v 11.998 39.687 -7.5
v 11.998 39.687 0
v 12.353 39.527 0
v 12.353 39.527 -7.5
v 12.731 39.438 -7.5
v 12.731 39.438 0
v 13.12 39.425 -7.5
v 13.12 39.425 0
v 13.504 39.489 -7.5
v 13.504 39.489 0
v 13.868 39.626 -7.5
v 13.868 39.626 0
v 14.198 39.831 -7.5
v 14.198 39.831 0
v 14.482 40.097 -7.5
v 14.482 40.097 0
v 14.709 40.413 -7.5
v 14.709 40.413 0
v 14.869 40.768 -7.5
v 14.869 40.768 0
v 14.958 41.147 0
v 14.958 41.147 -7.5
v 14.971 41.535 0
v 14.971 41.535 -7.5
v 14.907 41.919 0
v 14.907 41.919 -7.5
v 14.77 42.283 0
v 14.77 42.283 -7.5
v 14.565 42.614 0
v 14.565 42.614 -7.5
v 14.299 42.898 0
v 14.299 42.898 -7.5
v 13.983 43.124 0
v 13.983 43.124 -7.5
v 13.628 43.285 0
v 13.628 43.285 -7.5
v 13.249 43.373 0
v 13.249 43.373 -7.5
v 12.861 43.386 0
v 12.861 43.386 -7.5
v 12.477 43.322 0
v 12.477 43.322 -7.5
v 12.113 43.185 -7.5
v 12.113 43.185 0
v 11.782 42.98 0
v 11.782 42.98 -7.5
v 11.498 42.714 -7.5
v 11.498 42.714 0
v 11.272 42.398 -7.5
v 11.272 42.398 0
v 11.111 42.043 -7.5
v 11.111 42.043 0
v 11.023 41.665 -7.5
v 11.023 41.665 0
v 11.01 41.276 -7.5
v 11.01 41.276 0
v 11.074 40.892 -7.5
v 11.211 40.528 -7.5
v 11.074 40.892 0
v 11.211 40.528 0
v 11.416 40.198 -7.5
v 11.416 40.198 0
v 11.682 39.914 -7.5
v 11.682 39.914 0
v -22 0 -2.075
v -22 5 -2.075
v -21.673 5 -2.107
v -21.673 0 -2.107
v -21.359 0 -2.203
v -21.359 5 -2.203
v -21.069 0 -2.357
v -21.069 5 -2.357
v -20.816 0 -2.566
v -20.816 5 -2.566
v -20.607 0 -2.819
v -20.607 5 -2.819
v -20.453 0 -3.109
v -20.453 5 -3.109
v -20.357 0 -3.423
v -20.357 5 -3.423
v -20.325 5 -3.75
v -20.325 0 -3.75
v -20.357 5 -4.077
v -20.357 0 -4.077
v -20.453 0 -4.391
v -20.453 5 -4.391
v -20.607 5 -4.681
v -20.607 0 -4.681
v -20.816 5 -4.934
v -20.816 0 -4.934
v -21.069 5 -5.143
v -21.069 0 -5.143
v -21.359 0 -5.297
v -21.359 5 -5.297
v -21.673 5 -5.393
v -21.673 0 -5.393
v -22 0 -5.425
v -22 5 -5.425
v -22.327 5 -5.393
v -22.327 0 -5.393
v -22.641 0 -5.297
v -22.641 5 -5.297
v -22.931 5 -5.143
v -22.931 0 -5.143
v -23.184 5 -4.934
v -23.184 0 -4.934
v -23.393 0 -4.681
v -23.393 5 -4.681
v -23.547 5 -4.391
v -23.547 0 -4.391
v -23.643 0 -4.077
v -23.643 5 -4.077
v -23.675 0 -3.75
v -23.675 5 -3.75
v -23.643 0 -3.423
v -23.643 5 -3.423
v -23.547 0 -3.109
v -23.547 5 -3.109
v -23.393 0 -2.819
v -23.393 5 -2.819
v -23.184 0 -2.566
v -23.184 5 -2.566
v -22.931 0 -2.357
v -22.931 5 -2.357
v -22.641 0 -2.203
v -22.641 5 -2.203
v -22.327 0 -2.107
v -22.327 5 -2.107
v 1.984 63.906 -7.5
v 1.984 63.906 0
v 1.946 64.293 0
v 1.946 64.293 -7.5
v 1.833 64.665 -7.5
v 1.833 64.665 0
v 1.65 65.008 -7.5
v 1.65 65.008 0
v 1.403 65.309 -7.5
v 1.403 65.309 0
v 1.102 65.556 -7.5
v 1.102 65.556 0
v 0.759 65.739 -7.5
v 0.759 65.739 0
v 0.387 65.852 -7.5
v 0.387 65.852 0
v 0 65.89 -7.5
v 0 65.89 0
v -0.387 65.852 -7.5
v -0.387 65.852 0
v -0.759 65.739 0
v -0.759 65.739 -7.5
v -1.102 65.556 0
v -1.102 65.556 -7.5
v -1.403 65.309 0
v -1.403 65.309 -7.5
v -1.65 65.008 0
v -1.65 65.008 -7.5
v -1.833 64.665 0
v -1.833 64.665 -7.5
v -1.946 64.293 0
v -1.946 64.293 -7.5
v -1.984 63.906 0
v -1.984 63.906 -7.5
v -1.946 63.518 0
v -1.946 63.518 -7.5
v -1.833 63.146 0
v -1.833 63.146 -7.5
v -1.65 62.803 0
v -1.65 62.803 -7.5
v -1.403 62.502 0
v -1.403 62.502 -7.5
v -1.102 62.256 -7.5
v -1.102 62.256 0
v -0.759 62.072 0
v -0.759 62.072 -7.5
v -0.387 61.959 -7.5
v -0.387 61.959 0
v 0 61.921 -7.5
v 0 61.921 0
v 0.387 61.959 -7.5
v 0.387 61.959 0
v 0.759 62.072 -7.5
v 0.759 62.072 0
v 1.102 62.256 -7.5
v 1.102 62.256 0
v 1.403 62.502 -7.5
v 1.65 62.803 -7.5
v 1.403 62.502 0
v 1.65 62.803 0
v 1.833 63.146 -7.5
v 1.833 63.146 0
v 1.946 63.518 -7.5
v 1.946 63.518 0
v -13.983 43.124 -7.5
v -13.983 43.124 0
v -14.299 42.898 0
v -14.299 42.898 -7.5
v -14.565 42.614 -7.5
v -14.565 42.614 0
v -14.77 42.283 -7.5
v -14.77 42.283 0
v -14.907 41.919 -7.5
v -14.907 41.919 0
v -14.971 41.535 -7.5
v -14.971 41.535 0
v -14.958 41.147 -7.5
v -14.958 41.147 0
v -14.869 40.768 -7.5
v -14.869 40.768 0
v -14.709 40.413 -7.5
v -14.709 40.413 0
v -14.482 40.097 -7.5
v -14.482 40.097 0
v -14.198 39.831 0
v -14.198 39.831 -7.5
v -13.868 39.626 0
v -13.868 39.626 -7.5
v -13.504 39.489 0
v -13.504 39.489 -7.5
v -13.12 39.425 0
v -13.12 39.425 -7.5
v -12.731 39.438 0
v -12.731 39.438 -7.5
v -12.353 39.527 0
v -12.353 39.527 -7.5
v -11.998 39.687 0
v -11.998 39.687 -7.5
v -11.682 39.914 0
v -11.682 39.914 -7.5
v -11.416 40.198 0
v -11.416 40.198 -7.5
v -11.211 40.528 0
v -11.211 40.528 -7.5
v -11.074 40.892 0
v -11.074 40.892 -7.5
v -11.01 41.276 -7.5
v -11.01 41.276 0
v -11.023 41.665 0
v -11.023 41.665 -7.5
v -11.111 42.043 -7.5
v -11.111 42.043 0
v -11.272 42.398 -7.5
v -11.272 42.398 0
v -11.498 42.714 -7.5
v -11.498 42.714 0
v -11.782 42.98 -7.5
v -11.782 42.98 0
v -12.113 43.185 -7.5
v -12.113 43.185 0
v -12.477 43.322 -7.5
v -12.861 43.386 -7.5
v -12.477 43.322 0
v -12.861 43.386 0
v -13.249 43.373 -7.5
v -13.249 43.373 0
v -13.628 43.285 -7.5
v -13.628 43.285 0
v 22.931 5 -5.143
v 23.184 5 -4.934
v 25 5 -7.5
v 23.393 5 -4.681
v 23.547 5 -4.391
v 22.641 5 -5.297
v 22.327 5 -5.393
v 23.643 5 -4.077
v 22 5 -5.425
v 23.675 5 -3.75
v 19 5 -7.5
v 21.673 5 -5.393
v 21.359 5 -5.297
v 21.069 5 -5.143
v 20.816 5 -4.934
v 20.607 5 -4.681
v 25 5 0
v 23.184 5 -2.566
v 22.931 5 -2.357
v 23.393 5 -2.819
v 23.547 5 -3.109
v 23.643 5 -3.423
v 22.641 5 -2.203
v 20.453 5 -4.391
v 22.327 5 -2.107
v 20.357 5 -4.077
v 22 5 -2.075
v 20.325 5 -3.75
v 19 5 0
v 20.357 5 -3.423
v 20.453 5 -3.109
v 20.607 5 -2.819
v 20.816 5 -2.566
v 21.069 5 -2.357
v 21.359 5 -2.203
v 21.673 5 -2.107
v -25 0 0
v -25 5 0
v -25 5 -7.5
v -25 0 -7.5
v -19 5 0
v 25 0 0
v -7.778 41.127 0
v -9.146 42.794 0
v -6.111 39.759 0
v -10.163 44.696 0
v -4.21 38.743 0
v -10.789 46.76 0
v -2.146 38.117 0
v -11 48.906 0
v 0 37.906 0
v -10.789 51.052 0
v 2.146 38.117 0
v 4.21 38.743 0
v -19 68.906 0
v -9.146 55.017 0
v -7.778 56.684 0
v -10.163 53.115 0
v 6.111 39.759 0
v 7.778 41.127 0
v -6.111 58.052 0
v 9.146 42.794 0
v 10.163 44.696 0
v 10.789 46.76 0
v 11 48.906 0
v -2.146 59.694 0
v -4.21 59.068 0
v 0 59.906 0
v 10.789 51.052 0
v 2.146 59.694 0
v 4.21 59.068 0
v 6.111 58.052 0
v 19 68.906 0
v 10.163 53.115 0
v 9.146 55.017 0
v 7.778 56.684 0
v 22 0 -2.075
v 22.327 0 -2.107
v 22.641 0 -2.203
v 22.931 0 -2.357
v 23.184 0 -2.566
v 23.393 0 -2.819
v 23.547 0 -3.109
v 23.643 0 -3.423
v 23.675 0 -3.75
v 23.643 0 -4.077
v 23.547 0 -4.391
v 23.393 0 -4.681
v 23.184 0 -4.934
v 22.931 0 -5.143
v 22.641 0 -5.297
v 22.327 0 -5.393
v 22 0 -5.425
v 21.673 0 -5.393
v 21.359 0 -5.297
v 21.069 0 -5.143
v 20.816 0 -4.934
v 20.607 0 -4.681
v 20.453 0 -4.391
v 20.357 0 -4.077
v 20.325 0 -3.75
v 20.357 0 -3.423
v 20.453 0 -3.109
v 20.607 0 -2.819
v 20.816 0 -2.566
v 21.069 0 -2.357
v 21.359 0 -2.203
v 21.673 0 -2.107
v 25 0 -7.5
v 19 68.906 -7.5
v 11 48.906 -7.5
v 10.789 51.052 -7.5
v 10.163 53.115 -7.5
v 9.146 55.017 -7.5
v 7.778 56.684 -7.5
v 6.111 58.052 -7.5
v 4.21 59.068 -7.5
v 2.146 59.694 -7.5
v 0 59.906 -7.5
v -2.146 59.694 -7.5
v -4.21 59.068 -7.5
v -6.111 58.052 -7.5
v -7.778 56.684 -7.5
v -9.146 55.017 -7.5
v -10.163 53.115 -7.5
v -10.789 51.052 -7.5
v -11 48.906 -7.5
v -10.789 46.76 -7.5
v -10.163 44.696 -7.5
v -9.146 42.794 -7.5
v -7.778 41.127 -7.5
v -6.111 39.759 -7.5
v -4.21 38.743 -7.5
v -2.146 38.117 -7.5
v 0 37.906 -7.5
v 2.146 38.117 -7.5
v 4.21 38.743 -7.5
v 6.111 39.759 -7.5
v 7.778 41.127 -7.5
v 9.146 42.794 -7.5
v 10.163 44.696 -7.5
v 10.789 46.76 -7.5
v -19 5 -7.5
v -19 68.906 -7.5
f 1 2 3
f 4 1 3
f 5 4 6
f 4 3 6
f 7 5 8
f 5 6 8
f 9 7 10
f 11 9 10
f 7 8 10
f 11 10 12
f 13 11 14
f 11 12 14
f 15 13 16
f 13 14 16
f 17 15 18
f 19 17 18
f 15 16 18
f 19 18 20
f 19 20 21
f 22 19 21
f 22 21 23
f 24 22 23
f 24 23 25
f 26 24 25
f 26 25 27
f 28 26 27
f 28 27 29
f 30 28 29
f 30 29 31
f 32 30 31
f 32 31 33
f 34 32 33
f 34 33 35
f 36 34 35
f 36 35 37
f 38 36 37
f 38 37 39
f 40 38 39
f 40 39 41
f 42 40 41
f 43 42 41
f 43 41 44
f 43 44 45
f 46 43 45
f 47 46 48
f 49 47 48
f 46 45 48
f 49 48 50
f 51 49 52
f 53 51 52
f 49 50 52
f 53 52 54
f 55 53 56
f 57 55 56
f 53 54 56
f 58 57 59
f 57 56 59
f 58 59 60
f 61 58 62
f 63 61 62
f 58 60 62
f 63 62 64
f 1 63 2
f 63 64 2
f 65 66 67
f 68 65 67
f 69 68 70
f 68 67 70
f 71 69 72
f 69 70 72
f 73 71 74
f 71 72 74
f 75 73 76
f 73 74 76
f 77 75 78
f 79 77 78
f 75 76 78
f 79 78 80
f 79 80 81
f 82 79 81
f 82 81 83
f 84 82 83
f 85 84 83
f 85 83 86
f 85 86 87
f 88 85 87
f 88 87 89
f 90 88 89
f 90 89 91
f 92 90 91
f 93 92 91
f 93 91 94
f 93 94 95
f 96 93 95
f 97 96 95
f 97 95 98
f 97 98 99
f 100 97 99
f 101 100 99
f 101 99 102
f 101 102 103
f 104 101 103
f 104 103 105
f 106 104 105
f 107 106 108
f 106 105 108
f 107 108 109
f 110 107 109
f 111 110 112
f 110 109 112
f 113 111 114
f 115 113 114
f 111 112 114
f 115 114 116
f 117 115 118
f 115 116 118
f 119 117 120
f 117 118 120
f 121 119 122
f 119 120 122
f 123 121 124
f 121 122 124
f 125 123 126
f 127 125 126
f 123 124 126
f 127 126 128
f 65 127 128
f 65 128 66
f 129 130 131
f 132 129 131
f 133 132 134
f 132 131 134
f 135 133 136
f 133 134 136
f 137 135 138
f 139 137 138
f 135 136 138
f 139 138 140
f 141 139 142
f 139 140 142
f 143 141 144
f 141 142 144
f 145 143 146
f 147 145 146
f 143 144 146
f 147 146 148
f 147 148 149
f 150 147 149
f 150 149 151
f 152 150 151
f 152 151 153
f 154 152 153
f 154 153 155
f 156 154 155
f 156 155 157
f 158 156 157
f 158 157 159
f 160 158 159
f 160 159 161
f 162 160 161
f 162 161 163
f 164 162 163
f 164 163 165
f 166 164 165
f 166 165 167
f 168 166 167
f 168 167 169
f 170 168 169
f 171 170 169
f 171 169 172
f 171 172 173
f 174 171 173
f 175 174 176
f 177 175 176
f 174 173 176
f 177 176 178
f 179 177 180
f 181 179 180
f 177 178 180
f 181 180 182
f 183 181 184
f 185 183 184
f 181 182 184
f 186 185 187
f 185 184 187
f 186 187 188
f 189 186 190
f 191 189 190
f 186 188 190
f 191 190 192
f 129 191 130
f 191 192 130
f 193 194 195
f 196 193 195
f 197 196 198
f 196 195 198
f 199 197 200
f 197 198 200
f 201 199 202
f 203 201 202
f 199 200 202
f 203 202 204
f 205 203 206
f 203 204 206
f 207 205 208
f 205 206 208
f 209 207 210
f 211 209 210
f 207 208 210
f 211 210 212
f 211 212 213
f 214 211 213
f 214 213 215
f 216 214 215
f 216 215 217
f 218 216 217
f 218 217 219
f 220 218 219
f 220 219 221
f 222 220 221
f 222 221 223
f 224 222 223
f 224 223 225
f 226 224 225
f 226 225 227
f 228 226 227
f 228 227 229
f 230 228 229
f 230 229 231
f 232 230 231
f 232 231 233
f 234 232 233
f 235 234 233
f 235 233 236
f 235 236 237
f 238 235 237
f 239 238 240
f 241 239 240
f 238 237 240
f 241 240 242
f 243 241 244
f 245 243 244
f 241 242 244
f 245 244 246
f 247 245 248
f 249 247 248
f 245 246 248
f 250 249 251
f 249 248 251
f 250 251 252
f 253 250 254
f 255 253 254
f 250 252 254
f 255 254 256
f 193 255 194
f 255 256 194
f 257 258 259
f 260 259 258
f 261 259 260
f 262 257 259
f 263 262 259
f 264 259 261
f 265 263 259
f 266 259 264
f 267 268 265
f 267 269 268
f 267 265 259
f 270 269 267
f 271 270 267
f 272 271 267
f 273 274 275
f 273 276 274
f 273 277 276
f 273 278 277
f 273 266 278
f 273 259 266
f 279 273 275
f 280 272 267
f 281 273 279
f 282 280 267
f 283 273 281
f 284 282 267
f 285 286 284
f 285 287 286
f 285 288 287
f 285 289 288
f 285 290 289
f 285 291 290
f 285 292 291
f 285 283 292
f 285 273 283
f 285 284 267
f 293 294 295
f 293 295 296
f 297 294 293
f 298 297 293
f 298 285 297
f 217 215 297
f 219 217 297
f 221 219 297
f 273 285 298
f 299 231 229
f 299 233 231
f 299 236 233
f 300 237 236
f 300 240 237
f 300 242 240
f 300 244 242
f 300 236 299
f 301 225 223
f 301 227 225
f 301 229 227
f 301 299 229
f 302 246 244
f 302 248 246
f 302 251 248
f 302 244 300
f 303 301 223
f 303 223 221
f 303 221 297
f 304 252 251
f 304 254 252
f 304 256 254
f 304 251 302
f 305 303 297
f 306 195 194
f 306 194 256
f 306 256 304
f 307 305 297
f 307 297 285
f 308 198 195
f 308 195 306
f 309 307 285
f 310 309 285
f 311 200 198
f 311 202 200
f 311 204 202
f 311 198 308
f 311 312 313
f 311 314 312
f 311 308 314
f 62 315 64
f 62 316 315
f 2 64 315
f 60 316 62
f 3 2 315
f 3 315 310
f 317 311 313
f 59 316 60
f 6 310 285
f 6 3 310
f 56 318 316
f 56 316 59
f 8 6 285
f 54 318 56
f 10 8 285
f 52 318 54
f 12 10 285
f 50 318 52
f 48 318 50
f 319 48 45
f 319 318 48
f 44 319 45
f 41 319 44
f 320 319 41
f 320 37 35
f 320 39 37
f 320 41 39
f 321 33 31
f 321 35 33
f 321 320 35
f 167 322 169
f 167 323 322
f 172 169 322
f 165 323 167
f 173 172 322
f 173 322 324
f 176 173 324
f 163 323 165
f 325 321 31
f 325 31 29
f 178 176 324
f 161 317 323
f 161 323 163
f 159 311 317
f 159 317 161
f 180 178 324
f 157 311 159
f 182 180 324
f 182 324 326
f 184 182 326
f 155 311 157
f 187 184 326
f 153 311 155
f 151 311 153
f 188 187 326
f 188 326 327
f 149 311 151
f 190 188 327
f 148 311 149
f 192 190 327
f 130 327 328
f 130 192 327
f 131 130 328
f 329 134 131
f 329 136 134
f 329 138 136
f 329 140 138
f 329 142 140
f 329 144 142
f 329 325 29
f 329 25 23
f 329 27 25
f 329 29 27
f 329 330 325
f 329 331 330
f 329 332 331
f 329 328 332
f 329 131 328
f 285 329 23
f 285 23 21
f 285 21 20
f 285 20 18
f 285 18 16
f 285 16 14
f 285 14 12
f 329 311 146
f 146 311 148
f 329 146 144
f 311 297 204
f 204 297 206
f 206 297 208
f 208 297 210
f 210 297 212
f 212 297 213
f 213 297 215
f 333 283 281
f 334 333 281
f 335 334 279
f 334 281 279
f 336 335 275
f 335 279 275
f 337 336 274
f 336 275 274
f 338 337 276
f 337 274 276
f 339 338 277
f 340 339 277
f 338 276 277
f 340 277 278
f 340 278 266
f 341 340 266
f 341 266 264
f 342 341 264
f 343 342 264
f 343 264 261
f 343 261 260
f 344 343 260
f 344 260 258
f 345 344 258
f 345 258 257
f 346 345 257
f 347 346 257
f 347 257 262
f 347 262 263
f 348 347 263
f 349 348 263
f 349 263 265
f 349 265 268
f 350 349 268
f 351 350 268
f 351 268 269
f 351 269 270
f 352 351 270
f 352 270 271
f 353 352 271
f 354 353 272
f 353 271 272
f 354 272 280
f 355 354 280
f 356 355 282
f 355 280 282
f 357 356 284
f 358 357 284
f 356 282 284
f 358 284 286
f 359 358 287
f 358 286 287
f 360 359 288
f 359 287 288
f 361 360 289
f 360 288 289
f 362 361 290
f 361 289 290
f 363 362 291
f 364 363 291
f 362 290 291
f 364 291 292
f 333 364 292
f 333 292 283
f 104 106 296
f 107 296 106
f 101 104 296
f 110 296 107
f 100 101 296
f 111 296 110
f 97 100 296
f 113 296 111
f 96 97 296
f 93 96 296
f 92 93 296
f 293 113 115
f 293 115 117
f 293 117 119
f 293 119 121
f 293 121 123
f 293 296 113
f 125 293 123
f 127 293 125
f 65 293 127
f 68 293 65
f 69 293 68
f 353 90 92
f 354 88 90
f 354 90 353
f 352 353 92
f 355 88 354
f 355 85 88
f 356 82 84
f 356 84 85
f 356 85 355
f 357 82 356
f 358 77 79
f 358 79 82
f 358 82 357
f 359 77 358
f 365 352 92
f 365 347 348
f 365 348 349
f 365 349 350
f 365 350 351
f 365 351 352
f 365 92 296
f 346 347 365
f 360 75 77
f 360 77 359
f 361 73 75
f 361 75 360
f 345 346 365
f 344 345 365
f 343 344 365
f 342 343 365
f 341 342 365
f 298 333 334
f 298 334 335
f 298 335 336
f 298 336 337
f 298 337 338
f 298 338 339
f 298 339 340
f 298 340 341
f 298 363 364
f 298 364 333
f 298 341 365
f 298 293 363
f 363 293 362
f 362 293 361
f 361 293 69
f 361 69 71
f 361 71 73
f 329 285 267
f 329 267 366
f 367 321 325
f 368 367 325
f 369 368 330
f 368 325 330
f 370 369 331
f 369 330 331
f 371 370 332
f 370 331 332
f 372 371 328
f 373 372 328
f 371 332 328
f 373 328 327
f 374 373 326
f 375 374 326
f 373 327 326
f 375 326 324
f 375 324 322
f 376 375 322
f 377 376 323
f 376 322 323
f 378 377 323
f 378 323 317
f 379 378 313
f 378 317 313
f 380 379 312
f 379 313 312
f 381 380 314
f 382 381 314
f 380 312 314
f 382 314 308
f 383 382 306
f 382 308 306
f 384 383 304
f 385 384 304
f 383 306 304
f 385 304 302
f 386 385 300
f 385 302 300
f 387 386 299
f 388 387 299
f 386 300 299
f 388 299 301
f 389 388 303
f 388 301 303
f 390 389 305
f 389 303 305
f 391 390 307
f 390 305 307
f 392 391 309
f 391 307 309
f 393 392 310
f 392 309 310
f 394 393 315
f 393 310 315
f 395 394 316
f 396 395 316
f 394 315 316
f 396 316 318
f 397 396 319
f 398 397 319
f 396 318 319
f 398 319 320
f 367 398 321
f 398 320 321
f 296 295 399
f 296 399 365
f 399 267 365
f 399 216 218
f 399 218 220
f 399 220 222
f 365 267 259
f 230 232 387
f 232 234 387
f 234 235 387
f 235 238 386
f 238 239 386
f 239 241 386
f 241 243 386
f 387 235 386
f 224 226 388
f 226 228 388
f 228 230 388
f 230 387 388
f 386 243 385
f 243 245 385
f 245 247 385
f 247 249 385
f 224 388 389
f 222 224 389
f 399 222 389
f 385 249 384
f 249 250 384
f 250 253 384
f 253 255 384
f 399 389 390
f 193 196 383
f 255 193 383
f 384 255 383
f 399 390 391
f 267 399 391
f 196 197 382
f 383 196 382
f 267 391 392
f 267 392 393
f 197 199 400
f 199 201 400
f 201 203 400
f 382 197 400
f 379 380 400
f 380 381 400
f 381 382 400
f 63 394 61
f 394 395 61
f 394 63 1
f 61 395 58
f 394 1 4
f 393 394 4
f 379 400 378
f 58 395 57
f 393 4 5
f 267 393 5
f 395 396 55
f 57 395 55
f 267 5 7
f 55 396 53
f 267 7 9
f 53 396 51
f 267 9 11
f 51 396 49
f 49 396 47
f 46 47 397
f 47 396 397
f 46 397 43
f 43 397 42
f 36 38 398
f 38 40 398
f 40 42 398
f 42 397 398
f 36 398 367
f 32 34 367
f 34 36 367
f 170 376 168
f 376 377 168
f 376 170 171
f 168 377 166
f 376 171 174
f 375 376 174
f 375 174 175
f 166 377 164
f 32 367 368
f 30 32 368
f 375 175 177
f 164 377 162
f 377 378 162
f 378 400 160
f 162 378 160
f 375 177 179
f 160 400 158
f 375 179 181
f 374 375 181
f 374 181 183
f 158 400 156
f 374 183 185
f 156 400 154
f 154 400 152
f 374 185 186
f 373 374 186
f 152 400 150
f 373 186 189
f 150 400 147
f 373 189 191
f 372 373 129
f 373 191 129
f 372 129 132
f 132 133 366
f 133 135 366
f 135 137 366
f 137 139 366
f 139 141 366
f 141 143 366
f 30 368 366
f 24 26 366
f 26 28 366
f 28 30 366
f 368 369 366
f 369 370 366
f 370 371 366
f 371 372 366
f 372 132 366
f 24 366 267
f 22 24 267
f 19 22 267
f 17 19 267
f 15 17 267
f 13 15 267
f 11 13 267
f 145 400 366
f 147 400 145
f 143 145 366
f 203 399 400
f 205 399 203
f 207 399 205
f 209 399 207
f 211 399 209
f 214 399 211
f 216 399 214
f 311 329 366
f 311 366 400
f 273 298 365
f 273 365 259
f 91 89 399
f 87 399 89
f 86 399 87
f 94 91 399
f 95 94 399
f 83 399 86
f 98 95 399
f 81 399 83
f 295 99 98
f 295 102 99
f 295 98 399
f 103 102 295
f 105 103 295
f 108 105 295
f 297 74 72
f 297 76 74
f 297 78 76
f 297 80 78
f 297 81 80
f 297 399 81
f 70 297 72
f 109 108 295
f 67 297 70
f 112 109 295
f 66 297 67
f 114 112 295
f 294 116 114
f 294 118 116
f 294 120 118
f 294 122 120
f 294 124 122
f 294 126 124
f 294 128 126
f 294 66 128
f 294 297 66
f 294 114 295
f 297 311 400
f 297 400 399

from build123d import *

# Parameters (mm, degrees)
SKETCH2_R           = 11
BOSS_EXTRUDE1_DEPTH = 7.5
SKETCH5_R           = 1.984375
CUT_EXTRUDE3_DEPTH  = 74.683320442
CIRPATTERN1_COUNT   = 3
SKETCH6_R           = 1.675
CUT_EXTRUDE4_DEPTH  = 70.030252146


with BuildPart() as part:
    # Sketch2 → Boss-Extrude1 (new body)
    with BuildSketch(Plane.XY):
        Polygon((-25, 0), (25, 0), (25, 5), (19, 5), (19, 68.9056), (-19, 68.9056), (-19, 5), (-25, 5), align=None)
        with Locations((0, 48.9056)):
            Circle(SKETCH2_R, mode=Mode.SUBTRACT)
    extrude(amount=-BOSS_EXTRUDE1_DEPTH)

    # Sketch5 → Cut-Extrude3 (cut, through all)
    with BuildSketch(Plane.XY):
        with Locations((0, 63.9056)):
            Circle(SKETCH5_R)
    cut_extrude3 = extrude(amount=-CUT_EXTRUDE3_DEPTH, mode=Mode.SUBTRACT)

    # CirPattern1: Cut-Extrude3 ×3 about axis
    cirpattern1_axis = Axis((0, 48.9056, 0), (0, 0, 1))
    for i in range(1, CIRPATTERN1_COUNT):
        add(cut_extrude3.rotate(cirpattern1_axis, i * 360 / CIRPATTERN1_COUNT), mode=Mode.SUBTRACT)

    # Sketch6 → Cut-Extrude4 (cut, through all)
    with BuildSketch(Plane(origin=(0, 5, 0), x_dir=(1, 0, 0), z_dir=(0, 1, 0))):
        with Locations(Location((22, 3.75, 0), (0, 0, 270))):
            Circle(SKETCH6_R)
        with Locations(Location((-22, 3.75, 0), (0, 0, 270))):
            Circle(SKETCH6_R)
    extrude(amount=-CUT_EXTRUDE4_DEPTH, mode=Mode.SUBTRACT)


solid = part.part
